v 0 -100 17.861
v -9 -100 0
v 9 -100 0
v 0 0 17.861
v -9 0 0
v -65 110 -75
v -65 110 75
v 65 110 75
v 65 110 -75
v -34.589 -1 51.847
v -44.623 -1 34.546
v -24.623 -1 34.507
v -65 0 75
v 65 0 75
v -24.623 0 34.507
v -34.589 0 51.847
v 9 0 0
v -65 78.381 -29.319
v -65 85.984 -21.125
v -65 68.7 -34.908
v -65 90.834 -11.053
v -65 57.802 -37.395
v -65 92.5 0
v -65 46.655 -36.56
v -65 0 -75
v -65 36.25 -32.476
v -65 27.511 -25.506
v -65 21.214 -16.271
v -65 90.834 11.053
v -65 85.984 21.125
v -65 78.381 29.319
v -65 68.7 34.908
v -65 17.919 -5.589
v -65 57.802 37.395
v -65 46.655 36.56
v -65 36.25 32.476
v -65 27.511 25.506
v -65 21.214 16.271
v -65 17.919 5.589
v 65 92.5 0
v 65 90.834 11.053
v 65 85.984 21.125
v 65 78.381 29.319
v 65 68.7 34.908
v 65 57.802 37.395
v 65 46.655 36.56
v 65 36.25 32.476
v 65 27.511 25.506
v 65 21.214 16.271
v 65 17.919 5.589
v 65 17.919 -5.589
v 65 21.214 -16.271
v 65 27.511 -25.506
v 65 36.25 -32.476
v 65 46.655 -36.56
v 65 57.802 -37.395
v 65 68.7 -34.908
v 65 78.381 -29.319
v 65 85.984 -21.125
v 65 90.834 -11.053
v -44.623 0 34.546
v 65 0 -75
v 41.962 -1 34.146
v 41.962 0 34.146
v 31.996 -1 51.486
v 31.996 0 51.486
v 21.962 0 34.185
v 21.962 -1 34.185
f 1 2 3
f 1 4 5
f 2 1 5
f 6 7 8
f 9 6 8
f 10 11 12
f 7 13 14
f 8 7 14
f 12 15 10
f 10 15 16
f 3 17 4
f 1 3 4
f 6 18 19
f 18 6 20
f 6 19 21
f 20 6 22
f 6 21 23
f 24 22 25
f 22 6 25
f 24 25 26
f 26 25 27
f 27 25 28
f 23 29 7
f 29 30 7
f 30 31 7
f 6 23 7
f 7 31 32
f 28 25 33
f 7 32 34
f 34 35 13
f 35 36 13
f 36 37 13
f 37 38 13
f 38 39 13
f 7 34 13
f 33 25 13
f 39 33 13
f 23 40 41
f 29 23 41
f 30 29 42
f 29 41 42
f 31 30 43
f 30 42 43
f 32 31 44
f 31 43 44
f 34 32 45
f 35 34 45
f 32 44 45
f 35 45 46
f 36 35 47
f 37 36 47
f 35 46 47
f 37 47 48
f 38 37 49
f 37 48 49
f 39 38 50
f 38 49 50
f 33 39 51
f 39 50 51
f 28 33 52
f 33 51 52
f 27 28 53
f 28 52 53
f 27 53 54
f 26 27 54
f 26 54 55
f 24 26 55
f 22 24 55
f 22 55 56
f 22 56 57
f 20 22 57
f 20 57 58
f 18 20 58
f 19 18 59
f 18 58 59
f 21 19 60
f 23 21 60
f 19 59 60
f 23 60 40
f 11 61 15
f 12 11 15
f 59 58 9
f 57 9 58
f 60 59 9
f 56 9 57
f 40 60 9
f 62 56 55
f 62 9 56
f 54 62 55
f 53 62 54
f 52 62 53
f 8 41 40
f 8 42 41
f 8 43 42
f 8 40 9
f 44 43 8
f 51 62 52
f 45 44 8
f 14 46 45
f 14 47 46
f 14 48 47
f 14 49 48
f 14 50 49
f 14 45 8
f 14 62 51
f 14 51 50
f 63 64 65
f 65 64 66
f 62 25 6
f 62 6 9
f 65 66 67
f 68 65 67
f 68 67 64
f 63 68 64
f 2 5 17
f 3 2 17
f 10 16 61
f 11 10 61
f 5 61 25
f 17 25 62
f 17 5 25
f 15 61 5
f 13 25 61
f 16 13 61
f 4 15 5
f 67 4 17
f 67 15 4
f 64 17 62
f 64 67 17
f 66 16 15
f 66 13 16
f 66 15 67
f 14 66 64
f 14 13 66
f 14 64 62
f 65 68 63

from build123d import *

# Parameters (mm, degrees)
F0_W     = 130
F0_H     = 150
F1_DEPTH = 110
F2_R     = 37.5
F3_DEPTH = 130
F5_DEPTH = 100
F6_DEPTH = 1


with BuildPart() as f1:
    # F0 (on Front) → F1 (new body)
    with BuildSketch(Plane.XZ):
        Rectangle(F0_W, F0_H)
    extrude(amount=-F1_DEPTH)

    # F2 (on face) → F3 (cut)
    with BuildSketch(Plane.YZ.offset(65)):
        with Locations((55, 0)):
            Circle(F2_R)
    extrude(amount=-F3_DEPTH, mode=Mode.SUBTRACT)

    # F4 (on Front) → F5 (join)
    with BuildSketch(Plane.XZ):
        Polygon((-9, 0), (9, 0), (0, 17.860571), align=None)
    extrude(amount=F5_DEPTH)

    # F4 (on Front) → F6 (join)
    with BuildSketch(Plane.XZ):
        Polygon((-44.622627, 34.545667), (-24.622664, 34.507253), (-34.589379, 51.846936), align=None)
        Polygon((21.962458, 34.184783), (41.962421, 34.14637), (31.995706, 51.486053), align=None)
    extrude(amount=F6_DEPTH)


solid = f1.part
